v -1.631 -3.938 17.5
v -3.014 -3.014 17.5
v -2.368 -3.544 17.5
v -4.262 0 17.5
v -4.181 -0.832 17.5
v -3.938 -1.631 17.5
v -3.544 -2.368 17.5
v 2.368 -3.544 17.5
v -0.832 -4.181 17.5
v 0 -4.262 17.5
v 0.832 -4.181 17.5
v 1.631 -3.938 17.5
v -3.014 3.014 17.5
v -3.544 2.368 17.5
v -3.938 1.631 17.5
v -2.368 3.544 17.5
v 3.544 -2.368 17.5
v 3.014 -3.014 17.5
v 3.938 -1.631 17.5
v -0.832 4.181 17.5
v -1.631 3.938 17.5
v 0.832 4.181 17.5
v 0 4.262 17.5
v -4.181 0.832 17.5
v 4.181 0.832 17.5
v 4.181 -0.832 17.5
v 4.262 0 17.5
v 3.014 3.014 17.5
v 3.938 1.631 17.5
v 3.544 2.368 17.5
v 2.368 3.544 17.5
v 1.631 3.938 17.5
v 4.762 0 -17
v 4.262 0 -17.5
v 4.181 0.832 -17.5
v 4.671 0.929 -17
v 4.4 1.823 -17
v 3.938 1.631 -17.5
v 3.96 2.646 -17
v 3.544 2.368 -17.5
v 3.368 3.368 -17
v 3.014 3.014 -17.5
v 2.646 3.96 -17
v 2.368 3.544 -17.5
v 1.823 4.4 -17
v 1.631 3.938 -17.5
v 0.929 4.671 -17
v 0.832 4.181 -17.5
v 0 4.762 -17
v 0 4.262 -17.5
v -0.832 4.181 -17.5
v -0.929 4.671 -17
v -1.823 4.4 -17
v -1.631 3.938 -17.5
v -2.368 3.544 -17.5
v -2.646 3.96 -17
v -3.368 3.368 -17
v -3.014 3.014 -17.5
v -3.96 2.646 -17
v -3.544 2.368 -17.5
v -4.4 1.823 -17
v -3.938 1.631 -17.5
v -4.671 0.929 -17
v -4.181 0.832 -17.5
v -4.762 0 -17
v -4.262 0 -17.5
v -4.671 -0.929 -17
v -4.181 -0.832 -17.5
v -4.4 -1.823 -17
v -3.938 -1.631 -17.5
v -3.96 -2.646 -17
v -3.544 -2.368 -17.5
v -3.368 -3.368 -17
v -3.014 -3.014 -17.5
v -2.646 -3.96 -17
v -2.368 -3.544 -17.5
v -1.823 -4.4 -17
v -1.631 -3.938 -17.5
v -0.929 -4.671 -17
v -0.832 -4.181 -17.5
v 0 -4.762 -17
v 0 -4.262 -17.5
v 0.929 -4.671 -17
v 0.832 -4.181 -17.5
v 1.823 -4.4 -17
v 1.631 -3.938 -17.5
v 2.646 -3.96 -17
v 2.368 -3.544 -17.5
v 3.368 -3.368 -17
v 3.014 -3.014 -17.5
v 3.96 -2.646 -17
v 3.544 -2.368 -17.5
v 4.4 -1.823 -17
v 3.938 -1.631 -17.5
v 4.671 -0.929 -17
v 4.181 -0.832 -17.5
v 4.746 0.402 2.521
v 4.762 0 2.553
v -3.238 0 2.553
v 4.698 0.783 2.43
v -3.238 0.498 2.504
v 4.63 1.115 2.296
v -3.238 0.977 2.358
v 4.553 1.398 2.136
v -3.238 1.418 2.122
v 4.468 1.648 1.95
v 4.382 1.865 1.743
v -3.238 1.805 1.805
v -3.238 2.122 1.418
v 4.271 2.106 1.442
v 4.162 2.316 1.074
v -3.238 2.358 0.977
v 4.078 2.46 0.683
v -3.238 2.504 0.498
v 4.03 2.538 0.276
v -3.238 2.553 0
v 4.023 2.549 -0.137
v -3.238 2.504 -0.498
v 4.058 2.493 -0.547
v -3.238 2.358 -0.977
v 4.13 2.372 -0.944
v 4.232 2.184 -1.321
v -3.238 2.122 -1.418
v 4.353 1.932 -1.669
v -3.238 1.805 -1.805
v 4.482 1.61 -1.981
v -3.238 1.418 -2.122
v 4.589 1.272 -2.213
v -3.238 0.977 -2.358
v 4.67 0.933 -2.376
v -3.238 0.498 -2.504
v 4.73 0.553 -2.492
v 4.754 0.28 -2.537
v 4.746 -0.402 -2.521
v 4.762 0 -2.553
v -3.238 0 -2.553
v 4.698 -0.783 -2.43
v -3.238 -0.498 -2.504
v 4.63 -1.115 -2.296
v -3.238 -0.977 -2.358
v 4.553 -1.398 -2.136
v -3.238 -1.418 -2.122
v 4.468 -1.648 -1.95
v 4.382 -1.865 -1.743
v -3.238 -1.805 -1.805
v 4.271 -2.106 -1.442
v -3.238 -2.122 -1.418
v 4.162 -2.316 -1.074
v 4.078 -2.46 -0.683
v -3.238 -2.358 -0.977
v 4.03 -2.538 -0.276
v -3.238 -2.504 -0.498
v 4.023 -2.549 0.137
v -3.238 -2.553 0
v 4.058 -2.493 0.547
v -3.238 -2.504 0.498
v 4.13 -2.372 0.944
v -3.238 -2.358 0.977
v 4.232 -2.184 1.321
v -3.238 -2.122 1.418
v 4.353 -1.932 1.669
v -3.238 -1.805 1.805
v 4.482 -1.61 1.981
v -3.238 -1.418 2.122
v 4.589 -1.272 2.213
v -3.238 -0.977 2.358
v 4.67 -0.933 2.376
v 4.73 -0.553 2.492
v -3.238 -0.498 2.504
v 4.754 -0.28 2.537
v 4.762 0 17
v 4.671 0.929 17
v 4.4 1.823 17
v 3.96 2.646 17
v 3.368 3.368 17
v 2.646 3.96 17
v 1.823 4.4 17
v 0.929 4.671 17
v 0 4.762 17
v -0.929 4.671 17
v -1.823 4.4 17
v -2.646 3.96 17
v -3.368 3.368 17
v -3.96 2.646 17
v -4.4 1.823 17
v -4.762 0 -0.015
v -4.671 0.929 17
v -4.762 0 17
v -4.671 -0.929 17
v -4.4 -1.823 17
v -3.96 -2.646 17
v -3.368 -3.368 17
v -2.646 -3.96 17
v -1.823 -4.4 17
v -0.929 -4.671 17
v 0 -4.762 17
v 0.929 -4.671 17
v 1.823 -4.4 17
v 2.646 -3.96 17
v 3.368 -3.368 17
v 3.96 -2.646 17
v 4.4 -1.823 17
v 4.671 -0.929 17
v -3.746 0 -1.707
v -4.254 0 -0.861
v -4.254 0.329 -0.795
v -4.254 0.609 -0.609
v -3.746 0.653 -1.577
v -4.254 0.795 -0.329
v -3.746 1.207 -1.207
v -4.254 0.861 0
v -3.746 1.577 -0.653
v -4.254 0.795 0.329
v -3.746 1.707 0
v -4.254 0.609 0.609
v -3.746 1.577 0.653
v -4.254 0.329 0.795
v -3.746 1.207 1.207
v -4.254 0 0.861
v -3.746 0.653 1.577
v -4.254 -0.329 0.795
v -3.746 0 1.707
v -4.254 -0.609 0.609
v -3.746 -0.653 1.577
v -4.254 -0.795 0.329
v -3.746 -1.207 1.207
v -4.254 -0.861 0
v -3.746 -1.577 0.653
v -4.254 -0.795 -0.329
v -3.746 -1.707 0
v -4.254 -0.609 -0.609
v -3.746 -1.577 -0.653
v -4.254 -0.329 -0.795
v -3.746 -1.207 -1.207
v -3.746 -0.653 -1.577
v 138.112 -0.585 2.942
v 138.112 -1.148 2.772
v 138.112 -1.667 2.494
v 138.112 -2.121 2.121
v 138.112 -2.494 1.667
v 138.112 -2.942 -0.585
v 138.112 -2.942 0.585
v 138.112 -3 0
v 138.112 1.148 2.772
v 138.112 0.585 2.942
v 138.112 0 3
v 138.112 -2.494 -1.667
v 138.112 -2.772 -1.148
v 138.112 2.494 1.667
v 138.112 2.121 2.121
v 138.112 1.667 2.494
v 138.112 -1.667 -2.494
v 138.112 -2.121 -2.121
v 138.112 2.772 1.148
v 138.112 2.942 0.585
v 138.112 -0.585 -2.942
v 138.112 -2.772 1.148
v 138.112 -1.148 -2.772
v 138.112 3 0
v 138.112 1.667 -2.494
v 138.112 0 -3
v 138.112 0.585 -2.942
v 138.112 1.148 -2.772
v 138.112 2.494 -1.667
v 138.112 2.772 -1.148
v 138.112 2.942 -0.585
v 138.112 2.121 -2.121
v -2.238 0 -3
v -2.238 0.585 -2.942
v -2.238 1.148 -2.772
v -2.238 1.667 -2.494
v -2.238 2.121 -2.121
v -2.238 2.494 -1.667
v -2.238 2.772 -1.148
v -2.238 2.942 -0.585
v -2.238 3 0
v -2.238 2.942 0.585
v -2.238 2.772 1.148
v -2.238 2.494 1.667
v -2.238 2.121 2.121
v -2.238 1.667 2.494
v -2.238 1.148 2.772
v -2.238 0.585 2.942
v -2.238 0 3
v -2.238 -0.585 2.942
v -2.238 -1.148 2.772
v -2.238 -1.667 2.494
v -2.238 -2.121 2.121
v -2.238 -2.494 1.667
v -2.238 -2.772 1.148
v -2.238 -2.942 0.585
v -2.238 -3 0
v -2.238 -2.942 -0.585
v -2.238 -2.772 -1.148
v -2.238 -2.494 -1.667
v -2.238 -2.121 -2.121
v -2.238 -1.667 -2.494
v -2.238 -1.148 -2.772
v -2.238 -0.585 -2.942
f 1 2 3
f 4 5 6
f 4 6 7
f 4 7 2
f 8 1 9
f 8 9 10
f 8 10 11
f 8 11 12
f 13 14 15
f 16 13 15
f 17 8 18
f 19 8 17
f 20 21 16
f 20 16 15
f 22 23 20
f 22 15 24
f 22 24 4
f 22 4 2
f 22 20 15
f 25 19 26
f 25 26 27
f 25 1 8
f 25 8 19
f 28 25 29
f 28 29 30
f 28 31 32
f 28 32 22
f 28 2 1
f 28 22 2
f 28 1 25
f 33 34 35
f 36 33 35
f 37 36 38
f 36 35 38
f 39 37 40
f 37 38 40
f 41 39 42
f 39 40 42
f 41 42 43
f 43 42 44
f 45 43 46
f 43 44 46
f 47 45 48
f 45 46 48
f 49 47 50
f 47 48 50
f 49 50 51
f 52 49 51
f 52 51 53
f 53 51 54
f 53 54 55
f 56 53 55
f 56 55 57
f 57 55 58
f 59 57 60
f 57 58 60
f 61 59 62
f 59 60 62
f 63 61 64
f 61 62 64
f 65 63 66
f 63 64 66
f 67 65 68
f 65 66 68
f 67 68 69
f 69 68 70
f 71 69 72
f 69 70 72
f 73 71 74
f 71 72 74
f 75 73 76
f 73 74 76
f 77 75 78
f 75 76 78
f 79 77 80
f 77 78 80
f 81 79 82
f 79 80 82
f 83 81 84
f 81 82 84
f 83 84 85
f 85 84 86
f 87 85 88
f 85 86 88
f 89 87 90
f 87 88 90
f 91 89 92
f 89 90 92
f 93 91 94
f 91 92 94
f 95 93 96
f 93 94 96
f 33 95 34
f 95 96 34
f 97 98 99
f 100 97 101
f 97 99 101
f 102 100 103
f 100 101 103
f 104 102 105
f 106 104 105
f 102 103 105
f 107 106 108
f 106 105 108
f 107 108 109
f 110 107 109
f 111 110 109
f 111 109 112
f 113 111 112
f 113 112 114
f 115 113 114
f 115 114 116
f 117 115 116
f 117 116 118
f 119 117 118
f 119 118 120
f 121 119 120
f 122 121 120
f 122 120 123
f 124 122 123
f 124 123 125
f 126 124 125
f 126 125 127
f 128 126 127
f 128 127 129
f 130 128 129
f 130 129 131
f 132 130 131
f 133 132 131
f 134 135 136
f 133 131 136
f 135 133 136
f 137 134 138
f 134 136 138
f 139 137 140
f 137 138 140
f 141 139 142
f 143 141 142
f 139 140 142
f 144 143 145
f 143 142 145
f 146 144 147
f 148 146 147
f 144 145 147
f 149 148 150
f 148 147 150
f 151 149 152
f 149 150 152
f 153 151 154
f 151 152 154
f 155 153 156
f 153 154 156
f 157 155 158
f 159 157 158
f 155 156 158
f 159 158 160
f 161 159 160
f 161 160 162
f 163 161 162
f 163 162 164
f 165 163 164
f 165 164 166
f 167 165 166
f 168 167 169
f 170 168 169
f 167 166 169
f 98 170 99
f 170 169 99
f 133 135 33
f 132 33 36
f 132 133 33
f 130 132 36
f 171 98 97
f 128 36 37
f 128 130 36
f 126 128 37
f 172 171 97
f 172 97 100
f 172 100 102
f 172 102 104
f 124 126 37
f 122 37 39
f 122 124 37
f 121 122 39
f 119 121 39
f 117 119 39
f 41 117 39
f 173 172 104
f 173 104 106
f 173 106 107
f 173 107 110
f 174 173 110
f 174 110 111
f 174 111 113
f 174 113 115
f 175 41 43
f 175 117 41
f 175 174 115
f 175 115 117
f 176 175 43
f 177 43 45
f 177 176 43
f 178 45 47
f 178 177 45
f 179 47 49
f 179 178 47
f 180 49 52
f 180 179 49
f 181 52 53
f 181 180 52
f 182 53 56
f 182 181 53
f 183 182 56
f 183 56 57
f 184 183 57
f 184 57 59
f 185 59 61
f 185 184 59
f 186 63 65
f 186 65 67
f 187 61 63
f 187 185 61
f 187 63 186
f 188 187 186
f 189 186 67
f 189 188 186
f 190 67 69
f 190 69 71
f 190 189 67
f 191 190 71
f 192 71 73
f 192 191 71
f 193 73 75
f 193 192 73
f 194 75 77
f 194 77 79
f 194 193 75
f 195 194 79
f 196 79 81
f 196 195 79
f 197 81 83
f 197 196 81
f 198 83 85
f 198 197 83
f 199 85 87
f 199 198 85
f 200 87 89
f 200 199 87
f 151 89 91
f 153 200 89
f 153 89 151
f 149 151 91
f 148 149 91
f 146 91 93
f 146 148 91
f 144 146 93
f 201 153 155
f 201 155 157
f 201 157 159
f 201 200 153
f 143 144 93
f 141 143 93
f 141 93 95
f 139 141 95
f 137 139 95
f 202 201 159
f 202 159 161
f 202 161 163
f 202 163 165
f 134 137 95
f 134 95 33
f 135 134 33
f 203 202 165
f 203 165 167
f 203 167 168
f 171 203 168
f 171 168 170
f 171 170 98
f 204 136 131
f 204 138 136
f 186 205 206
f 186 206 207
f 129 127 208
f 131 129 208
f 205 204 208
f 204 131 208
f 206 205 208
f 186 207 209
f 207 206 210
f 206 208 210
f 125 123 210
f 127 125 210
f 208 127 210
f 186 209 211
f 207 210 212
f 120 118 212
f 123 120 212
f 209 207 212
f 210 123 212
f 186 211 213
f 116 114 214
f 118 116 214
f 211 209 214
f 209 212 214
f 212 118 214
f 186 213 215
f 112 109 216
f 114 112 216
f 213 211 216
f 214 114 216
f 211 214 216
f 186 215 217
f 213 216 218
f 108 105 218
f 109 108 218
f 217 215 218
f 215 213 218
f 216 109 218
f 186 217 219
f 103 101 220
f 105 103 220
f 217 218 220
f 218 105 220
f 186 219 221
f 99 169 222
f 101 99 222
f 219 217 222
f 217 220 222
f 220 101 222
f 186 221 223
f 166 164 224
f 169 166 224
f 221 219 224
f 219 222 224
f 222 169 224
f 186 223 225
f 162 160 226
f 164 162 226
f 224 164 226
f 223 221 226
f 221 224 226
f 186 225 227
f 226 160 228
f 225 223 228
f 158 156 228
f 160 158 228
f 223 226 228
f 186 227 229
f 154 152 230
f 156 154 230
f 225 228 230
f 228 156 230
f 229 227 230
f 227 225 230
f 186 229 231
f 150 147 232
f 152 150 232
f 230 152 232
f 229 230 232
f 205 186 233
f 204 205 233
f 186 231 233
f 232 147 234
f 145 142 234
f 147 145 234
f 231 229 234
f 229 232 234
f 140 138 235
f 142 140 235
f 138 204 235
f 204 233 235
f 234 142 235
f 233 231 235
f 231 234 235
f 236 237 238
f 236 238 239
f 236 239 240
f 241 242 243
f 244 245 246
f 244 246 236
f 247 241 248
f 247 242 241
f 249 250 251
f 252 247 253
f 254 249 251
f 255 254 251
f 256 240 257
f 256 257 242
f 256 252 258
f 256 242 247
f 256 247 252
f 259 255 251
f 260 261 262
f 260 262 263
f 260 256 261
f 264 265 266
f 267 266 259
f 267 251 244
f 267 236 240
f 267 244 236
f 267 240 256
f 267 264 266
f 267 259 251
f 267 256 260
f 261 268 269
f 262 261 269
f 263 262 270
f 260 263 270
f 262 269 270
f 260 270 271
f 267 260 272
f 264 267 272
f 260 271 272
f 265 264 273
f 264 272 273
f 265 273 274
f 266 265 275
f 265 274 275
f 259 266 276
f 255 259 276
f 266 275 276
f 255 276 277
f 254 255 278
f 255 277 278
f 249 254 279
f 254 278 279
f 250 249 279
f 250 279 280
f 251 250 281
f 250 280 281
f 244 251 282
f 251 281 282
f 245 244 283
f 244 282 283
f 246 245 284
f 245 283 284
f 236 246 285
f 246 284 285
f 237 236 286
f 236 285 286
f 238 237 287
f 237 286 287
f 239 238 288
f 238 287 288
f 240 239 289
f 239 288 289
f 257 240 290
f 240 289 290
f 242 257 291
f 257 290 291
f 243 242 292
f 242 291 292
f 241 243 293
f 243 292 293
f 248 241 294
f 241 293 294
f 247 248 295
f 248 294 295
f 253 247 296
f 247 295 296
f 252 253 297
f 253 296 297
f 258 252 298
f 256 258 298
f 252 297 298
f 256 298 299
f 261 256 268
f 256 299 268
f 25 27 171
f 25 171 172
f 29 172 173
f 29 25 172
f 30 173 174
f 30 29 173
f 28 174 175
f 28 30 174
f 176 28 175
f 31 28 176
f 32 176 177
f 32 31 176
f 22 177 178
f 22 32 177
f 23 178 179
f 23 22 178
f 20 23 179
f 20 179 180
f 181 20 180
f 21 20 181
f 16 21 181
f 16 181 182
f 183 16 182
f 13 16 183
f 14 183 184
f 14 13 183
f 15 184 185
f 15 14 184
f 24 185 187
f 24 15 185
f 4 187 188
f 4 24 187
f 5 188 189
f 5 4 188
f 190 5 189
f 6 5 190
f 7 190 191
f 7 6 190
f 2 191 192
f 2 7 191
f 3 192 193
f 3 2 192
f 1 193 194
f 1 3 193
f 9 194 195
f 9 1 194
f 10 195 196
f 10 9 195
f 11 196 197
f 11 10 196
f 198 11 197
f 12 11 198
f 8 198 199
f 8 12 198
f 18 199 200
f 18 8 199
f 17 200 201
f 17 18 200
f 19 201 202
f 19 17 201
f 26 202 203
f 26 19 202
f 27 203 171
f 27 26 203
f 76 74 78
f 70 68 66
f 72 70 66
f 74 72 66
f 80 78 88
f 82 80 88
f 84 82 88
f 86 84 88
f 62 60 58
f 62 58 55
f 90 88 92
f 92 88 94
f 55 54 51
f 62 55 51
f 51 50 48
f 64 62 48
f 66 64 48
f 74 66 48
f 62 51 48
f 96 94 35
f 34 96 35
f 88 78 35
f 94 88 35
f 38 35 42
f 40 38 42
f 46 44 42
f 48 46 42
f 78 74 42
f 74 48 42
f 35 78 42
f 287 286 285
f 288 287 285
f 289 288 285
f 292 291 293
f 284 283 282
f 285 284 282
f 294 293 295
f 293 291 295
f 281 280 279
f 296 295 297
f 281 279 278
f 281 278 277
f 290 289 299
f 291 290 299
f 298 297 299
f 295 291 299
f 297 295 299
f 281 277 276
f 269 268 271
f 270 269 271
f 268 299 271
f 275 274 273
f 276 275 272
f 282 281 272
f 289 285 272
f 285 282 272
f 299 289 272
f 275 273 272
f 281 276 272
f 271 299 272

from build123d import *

# Parameters (mm, degrees)
SKETCH1_R                   = 4.7625
BOSS_EXTRUDE1_DEPTH         = 17.5
F_1_4_20_TAPPED_HOLE1_D     = 5.1054
F_1_4_20_TAPPED_HOLE1_DEPTH = 8
F_1_4_20_TAPPED_HOLE1_TIP   = 1.533816902
BOSS_EXTRUDE2_DEPTH         = 133.35
BOSS_EXTRUDE2_DEPTH_BACK    = 7
SKETCH4_R                   = 3
CHAMFER1_SIZE               = 0.5


with BuildPart() as part:
    # Sketch1 → Boss-Extrude1 (new, symmetric)
    with BuildSketch(Plane.XY):
        Circle(SKETCH1_R)
    extrude(amount=BOSS_EXTRUDE1_DEPTH, both=True)

    # 1/4-20 Tapped Hole1
    with Locations(Plane(origin=(4.7625, 0, 0), x_dir=(0, 0, -1), z_dir=(1, 0, 0))):
        with Locations((0, 0)):
            Hole(F_1_4_20_TAPPED_HOLE1_D / 2, depth=F_1_4_20_TAPPED_HOLE1_DEPTH)
            with Locations((0, 0, -(F_1_4_20_TAPPED_HOLE1_DEPTH + F_1_4_20_TAPPED_HOLE1_TIP / 2))):  # 118° drill point
                Cone(0, F_1_4_20_TAPPED_HOLE1_D / 2, F_1_4_20_TAPPED_HOLE1_TIP, mode=Mode.SUBTRACT)

    # Chamfer1
    chamfer1_edges = [part.edges().sort_by_distance(p)[0] for p in [
        (-4.7625, 0, -17.5),
        (-4.7625, 0, 17.5),
    ]]
    chamfer(chamfer1_edges, length=CHAMFER1_SIZE)


with BuildPart() as body_2:
    # Sketch4 → Boss-Extrude2 (new, two sides: drawn at the far end of the back side and taken through both)
    with BuildSketch(Plane(origin=(4.7625, 0, 0), x_dir=(0, 0, -1), z_dir=(1, 0, 0)).offset(-BOSS_EXTRUDE2_DEPTH_BACK)):
        Circle(SKETCH4_R)
    extrude(amount=BOSS_EXTRUDE2_DEPTH + BOSS_EXTRUDE2_DEPTH_BACK)


solid = Compound([part.part, body_2.part])
